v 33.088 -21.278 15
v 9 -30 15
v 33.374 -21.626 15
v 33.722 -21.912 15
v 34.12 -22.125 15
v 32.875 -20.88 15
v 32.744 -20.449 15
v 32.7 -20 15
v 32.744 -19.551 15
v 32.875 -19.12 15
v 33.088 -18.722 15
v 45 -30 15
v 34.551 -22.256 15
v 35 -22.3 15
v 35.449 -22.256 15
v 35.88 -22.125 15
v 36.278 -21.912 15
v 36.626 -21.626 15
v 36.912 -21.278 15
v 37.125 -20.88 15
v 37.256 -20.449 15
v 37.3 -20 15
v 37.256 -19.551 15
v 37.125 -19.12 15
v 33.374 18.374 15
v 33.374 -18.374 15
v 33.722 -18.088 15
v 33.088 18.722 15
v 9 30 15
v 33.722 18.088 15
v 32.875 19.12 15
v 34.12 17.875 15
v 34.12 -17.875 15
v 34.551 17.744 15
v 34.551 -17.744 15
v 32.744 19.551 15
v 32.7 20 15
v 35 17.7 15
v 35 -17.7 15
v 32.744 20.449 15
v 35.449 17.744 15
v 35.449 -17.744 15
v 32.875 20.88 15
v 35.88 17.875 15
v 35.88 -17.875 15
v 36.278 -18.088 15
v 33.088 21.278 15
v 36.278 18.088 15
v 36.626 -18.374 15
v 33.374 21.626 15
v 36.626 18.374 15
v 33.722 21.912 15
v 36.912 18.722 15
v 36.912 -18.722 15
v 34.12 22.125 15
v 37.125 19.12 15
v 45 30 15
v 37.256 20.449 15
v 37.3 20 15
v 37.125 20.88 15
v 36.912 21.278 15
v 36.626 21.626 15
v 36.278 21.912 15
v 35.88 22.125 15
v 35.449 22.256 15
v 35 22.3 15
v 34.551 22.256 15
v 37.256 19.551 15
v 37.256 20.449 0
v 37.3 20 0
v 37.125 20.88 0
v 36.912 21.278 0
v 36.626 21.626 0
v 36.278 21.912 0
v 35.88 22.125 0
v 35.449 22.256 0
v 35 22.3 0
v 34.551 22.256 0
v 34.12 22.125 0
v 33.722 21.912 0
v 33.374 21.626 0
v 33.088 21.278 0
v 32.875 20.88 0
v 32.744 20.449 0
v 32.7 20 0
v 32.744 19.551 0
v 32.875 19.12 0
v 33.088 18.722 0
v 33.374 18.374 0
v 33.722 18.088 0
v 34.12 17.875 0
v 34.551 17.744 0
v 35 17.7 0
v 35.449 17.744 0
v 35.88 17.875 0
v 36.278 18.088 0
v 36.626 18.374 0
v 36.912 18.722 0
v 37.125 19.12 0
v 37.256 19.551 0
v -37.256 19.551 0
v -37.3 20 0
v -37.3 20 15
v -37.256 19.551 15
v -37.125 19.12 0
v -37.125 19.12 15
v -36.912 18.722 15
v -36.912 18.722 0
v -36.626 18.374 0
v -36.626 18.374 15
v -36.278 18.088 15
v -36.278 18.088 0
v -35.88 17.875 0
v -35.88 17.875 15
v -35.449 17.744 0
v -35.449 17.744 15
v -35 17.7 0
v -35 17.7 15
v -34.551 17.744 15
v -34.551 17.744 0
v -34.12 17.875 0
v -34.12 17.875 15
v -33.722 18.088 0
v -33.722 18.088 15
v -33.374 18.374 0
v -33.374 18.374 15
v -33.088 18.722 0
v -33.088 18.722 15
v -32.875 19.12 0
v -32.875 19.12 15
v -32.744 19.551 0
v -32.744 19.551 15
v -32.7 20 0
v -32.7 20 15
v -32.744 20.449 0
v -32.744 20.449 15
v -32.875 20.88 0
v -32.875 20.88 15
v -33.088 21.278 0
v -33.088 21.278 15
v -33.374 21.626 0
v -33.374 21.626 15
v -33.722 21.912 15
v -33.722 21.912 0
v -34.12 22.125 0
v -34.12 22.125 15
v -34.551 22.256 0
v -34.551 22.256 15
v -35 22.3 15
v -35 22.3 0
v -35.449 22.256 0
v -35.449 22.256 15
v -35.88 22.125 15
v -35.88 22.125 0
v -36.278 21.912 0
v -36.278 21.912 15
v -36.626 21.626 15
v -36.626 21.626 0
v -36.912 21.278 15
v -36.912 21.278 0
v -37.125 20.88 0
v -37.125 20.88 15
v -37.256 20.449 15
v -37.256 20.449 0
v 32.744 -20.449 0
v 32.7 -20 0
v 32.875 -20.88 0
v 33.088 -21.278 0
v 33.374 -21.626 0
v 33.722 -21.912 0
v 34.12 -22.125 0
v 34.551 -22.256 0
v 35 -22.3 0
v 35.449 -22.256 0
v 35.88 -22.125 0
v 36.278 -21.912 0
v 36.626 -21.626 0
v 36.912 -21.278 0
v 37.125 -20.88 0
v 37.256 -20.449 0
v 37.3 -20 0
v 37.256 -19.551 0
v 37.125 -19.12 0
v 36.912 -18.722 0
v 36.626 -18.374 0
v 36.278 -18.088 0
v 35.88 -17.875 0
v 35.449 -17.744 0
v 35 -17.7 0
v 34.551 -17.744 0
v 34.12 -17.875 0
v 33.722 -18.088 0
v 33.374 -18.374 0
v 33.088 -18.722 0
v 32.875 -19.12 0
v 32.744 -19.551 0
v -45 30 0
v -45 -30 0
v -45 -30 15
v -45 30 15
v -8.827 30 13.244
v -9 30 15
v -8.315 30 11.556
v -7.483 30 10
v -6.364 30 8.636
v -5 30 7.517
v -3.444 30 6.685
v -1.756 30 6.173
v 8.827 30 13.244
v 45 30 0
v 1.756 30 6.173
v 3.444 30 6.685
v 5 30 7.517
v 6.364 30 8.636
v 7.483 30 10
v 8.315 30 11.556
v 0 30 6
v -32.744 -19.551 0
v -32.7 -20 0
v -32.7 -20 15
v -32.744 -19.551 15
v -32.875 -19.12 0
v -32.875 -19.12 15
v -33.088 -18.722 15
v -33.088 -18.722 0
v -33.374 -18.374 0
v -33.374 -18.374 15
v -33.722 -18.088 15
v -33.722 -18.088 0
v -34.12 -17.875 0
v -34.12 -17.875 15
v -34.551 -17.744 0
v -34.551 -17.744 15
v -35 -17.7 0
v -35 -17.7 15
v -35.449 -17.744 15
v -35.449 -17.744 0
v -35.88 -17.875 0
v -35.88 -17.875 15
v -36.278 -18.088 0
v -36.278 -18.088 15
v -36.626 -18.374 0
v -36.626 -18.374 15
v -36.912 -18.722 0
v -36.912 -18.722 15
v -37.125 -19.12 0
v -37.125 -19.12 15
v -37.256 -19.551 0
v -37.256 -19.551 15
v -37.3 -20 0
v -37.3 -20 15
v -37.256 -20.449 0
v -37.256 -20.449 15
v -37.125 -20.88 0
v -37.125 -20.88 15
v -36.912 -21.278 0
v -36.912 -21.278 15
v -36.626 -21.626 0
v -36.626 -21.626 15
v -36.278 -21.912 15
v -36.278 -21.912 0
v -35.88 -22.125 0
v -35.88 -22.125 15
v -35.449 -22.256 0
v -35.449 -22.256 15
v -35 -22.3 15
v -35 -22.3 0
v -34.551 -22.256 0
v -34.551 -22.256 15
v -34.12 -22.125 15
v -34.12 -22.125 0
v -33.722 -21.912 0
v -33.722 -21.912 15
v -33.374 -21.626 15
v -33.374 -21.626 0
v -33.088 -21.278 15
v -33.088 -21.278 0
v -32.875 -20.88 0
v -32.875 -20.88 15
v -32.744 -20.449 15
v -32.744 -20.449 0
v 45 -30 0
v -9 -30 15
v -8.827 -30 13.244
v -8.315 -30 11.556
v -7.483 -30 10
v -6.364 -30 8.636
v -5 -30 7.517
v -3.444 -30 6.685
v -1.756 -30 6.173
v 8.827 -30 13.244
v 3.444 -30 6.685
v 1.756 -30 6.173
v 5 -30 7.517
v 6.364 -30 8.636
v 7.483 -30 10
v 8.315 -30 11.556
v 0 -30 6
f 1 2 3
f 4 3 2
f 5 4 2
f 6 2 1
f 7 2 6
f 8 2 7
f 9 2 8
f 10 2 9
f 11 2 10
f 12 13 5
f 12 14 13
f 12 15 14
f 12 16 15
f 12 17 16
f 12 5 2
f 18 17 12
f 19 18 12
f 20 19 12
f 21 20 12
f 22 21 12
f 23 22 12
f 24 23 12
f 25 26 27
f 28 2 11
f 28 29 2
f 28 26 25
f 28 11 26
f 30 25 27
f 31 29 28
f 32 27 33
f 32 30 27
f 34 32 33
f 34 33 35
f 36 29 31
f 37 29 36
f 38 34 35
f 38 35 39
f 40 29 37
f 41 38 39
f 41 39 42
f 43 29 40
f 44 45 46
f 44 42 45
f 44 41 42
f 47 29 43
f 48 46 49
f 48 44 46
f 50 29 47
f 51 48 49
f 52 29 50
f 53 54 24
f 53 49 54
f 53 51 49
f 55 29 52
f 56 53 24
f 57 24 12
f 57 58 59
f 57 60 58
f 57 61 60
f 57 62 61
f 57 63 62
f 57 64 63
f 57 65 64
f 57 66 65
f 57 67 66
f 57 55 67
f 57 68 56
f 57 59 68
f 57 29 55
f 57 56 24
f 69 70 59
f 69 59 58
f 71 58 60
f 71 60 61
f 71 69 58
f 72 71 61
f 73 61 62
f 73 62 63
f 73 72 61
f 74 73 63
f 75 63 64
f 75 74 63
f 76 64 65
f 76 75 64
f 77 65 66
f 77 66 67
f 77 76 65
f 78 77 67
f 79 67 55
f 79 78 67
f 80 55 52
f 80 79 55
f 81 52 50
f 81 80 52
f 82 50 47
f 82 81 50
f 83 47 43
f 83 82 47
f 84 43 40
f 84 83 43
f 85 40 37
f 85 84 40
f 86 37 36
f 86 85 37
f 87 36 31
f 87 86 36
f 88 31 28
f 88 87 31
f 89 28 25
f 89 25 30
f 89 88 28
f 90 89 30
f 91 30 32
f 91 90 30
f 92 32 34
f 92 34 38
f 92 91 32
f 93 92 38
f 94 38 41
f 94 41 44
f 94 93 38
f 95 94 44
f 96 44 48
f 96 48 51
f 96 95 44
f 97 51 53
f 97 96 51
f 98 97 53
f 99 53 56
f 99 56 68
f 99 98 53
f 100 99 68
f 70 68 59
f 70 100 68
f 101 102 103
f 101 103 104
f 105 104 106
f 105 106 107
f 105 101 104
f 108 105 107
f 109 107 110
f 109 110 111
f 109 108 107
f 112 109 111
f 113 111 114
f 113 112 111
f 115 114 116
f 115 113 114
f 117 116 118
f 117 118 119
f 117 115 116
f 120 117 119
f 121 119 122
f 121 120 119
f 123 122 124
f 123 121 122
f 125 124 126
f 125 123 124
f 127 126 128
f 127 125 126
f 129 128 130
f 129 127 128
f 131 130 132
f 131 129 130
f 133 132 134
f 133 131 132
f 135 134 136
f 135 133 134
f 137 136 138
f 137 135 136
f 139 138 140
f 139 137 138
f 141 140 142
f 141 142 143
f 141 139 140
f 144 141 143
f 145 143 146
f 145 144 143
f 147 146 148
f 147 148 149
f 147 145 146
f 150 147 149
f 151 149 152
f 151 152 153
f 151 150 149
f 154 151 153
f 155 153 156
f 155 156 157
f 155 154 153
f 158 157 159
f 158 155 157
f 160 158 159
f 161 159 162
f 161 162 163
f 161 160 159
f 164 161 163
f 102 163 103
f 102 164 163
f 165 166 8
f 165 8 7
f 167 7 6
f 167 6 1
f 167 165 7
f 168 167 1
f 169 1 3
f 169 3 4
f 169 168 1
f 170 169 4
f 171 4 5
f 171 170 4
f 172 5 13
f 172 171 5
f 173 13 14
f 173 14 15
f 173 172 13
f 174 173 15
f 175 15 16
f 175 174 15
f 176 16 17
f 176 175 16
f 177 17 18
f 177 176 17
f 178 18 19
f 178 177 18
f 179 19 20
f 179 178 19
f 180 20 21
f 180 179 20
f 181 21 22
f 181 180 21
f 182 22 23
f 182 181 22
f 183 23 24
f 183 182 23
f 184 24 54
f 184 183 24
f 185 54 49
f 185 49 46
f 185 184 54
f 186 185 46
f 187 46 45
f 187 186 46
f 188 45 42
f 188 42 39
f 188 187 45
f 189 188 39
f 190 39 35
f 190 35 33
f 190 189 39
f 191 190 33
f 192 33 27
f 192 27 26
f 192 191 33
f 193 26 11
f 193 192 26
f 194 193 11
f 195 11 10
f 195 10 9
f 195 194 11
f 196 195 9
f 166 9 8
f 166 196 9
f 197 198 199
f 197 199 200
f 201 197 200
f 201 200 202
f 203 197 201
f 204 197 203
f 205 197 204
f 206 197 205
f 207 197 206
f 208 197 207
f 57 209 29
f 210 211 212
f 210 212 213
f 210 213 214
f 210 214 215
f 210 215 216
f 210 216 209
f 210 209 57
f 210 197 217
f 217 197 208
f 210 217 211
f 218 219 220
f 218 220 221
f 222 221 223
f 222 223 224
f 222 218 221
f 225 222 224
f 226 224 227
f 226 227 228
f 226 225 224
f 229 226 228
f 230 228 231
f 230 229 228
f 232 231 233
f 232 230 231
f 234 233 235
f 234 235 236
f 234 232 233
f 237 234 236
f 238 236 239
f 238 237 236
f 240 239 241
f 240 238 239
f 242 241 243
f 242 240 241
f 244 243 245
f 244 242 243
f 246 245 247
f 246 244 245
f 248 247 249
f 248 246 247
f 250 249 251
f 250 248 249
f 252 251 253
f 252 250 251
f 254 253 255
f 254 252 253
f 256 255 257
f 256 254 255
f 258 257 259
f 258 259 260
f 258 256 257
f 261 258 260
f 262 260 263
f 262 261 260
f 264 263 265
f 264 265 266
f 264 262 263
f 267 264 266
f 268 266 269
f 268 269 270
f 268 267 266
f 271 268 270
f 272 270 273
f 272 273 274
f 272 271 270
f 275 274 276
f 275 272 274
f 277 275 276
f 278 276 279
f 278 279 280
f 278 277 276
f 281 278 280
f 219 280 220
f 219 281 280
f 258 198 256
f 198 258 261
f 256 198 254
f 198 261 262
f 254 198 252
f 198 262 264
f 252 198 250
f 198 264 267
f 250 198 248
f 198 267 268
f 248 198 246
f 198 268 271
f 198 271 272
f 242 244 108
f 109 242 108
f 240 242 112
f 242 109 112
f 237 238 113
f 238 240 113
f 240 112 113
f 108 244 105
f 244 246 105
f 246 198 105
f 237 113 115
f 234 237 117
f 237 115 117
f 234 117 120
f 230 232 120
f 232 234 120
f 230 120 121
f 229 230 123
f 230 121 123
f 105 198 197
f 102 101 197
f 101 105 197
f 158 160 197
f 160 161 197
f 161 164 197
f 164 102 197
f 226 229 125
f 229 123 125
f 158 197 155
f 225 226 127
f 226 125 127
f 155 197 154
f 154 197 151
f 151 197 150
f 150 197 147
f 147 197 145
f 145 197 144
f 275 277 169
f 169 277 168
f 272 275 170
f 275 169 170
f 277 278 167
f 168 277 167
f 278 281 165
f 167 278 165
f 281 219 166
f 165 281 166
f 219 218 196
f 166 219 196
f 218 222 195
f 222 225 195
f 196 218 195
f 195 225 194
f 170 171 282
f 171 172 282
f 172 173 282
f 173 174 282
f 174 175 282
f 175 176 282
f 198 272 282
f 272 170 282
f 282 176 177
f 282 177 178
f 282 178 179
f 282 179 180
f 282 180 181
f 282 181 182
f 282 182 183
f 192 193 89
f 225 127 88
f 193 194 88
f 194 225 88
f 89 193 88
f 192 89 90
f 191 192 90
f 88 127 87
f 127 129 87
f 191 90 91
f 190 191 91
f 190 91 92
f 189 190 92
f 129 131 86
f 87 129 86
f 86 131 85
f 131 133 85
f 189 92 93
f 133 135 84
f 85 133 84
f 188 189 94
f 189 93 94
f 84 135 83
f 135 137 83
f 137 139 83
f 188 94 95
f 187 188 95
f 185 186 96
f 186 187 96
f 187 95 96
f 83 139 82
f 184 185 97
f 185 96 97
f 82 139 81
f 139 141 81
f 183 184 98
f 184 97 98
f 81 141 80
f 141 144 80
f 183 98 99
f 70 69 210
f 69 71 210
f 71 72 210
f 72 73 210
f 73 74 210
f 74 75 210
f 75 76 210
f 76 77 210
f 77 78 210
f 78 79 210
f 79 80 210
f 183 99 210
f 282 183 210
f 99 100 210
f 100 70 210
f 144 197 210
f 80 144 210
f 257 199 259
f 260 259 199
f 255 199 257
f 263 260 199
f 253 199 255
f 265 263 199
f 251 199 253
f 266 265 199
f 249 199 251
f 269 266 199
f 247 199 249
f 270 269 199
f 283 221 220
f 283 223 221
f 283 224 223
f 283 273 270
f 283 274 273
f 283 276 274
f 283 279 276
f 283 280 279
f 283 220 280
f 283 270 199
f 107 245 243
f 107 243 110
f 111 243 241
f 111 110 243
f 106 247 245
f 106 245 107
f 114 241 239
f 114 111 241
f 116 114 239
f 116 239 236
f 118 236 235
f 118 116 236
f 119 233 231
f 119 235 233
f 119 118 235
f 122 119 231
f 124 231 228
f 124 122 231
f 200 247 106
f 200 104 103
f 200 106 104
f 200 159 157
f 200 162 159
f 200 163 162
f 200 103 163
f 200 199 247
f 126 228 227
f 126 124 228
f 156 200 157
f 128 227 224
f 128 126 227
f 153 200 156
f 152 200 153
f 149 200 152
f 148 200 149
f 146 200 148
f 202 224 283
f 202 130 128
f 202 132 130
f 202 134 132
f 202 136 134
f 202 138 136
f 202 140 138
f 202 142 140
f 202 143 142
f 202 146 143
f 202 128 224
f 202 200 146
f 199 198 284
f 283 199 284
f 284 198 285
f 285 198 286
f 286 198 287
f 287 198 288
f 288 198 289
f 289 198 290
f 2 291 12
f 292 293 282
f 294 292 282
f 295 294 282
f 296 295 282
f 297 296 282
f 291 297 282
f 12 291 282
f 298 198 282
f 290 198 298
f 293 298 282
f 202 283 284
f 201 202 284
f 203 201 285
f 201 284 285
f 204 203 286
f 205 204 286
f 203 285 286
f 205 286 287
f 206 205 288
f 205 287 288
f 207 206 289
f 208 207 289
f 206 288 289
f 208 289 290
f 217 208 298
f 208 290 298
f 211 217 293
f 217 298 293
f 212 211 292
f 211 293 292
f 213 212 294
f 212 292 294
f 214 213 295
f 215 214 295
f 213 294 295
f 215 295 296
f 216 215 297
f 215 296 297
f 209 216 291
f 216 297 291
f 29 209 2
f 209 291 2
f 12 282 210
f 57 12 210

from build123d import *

# Parameters (mm, degrees)
SKETCH1_W           = 90
SKETCH1_H           = 60
SKETCH1_R           = 2.3
BOSS_EXTRUDE1_DEPTH = 15
SKETCH2_R           = 9
CUT_EXTRUDE1_DEPTH  = 72


with BuildPart() as part:
    # Sketch1 → Boss-Extrude1 (new body)
    with BuildSketch(Plane.XY):
        Rectangle(SKETCH1_W, SKETCH1_H)
        with Locations((-35, -20)):
            Circle(SKETCH1_R, mode=Mode.SUBTRACT)
        with Locations(Location((35, -20, 0), (0, 0, 180))):
            Circle(SKETCH1_R, mode=Mode.SUBTRACT)
        with Locations((35, 20)):
            Circle(SKETCH1_R, mode=Mode.SUBTRACT)
        with Locations(Location((-35, 20, 0), (0, 0, 180))):
            Circle(SKETCH1_R, mode=Mode.SUBTRACT)
    extrude(amount=BOSS_EXTRUDE1_DEPTH)

    # Sketch2 → Cut-Extrude1 (cut)
    with BuildSketch(Plane.XZ.offset(30)):
        with Locations((0, 15)):
            Circle(SKETCH2_R)
    extrude(amount=-CUT_EXTRUDE1_DEPTH, mode=Mode.SUBTRACT)


solid = part.part
